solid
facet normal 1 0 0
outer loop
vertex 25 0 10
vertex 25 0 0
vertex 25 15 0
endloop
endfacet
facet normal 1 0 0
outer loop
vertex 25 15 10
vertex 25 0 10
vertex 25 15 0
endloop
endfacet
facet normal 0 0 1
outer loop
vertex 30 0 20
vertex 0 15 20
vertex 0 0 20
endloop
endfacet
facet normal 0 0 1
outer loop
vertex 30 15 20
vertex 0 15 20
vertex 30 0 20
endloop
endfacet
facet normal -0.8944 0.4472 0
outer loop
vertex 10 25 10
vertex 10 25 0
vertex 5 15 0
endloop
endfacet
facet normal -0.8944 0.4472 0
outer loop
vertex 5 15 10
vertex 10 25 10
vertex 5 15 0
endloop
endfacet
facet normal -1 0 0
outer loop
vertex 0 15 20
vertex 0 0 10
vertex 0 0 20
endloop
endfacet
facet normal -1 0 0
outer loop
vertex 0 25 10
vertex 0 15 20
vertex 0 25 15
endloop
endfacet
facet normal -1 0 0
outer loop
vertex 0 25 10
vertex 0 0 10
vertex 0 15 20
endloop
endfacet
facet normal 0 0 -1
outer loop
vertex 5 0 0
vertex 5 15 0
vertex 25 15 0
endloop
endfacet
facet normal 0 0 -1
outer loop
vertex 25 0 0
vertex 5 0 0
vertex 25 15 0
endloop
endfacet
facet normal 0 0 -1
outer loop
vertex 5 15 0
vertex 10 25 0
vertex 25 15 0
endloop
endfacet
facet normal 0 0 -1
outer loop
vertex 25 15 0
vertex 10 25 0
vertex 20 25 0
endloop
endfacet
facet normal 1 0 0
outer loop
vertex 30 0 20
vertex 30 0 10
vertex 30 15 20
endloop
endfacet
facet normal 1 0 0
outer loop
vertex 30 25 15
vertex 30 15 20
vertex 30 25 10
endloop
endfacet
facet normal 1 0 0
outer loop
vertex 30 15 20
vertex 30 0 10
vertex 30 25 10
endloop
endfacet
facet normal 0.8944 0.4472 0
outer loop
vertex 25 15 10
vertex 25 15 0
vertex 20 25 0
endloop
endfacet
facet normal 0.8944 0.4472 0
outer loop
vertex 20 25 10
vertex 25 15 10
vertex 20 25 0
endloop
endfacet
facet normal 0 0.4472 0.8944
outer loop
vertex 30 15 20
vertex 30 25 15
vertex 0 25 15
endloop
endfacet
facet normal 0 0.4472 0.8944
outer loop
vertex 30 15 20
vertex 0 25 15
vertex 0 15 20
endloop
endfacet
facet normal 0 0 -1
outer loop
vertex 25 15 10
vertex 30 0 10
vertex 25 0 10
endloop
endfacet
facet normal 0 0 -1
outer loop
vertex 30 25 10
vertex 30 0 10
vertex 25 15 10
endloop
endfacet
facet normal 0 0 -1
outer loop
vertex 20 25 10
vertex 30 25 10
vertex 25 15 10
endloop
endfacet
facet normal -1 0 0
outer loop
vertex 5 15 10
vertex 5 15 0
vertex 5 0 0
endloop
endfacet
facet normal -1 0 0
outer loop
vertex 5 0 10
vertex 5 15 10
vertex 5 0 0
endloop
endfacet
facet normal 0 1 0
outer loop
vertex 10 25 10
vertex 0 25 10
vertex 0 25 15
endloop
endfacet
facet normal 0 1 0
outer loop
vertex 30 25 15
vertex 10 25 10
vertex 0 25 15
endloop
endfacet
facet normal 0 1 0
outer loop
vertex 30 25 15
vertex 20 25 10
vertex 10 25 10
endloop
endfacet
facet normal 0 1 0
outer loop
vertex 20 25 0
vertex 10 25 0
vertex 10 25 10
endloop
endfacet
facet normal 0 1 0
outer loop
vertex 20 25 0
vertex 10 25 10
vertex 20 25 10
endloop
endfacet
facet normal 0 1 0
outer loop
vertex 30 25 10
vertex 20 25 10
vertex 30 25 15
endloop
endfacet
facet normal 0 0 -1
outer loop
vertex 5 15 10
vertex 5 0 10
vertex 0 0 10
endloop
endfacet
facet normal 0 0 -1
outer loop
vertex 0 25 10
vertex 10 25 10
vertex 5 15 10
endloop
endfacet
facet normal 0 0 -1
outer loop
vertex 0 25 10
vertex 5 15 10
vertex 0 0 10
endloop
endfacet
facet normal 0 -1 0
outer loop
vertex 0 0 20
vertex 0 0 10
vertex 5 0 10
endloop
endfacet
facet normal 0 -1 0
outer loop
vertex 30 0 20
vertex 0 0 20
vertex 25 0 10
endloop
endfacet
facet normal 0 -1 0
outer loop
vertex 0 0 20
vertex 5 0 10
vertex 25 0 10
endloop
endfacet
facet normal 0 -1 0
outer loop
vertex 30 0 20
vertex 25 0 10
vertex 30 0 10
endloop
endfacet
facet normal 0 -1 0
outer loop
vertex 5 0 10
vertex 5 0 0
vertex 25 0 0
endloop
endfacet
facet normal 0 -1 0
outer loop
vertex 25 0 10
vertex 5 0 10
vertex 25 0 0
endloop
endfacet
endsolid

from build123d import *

# Parameters (mm, degrees)
SKETCH1_W           = 30
SKETCH1_H           = 25
BOSS_EXTRUDE1_DEPTH = 20
CUT_EXTRUDE1_DEPTH  = 50
CUT_EXTRUDE2_DEPTH  = 10


with BuildPart() as part:
    # Sketch1 → Boss-Extrude1 (new body)
    with BuildSketch(Plane.XY):
        with Locations((15, 12.5)):
            Rectangle(SKETCH1_W, SKETCH1_H)
    extrude(amount=BOSS_EXTRUDE1_DEPTH)

    # Sketch2 → Cut-Extrude1 (cut)
    with BuildSketch(Plane.ZY):
        Polygon((15, 25), (20, 15), (20, 25), align=None)
    extrude(amount=-CUT_EXTRUDE1_DEPTH, mode=Mode.SUBTRACT)

    # Sketch3 → Cut-Extrude2 (cut)
    with BuildSketch(Plane(origin=(0, 0, 0), x_dir=(-1, 0, 0), z_dir=(0, 0, -1))):
        Polygon((-20, 25), (-30, 25), (-30, 0), (-25, 0), (-25, 15), align=None)
        Polygon((0, 25), (-10, 25), (-5, 15), (-5, 0), (0, 0), align=None)
    extrude(amount=-CUT_EXTRUDE2_DEPTH, mode=Mode.SUBTRACT)


solid = part.part
